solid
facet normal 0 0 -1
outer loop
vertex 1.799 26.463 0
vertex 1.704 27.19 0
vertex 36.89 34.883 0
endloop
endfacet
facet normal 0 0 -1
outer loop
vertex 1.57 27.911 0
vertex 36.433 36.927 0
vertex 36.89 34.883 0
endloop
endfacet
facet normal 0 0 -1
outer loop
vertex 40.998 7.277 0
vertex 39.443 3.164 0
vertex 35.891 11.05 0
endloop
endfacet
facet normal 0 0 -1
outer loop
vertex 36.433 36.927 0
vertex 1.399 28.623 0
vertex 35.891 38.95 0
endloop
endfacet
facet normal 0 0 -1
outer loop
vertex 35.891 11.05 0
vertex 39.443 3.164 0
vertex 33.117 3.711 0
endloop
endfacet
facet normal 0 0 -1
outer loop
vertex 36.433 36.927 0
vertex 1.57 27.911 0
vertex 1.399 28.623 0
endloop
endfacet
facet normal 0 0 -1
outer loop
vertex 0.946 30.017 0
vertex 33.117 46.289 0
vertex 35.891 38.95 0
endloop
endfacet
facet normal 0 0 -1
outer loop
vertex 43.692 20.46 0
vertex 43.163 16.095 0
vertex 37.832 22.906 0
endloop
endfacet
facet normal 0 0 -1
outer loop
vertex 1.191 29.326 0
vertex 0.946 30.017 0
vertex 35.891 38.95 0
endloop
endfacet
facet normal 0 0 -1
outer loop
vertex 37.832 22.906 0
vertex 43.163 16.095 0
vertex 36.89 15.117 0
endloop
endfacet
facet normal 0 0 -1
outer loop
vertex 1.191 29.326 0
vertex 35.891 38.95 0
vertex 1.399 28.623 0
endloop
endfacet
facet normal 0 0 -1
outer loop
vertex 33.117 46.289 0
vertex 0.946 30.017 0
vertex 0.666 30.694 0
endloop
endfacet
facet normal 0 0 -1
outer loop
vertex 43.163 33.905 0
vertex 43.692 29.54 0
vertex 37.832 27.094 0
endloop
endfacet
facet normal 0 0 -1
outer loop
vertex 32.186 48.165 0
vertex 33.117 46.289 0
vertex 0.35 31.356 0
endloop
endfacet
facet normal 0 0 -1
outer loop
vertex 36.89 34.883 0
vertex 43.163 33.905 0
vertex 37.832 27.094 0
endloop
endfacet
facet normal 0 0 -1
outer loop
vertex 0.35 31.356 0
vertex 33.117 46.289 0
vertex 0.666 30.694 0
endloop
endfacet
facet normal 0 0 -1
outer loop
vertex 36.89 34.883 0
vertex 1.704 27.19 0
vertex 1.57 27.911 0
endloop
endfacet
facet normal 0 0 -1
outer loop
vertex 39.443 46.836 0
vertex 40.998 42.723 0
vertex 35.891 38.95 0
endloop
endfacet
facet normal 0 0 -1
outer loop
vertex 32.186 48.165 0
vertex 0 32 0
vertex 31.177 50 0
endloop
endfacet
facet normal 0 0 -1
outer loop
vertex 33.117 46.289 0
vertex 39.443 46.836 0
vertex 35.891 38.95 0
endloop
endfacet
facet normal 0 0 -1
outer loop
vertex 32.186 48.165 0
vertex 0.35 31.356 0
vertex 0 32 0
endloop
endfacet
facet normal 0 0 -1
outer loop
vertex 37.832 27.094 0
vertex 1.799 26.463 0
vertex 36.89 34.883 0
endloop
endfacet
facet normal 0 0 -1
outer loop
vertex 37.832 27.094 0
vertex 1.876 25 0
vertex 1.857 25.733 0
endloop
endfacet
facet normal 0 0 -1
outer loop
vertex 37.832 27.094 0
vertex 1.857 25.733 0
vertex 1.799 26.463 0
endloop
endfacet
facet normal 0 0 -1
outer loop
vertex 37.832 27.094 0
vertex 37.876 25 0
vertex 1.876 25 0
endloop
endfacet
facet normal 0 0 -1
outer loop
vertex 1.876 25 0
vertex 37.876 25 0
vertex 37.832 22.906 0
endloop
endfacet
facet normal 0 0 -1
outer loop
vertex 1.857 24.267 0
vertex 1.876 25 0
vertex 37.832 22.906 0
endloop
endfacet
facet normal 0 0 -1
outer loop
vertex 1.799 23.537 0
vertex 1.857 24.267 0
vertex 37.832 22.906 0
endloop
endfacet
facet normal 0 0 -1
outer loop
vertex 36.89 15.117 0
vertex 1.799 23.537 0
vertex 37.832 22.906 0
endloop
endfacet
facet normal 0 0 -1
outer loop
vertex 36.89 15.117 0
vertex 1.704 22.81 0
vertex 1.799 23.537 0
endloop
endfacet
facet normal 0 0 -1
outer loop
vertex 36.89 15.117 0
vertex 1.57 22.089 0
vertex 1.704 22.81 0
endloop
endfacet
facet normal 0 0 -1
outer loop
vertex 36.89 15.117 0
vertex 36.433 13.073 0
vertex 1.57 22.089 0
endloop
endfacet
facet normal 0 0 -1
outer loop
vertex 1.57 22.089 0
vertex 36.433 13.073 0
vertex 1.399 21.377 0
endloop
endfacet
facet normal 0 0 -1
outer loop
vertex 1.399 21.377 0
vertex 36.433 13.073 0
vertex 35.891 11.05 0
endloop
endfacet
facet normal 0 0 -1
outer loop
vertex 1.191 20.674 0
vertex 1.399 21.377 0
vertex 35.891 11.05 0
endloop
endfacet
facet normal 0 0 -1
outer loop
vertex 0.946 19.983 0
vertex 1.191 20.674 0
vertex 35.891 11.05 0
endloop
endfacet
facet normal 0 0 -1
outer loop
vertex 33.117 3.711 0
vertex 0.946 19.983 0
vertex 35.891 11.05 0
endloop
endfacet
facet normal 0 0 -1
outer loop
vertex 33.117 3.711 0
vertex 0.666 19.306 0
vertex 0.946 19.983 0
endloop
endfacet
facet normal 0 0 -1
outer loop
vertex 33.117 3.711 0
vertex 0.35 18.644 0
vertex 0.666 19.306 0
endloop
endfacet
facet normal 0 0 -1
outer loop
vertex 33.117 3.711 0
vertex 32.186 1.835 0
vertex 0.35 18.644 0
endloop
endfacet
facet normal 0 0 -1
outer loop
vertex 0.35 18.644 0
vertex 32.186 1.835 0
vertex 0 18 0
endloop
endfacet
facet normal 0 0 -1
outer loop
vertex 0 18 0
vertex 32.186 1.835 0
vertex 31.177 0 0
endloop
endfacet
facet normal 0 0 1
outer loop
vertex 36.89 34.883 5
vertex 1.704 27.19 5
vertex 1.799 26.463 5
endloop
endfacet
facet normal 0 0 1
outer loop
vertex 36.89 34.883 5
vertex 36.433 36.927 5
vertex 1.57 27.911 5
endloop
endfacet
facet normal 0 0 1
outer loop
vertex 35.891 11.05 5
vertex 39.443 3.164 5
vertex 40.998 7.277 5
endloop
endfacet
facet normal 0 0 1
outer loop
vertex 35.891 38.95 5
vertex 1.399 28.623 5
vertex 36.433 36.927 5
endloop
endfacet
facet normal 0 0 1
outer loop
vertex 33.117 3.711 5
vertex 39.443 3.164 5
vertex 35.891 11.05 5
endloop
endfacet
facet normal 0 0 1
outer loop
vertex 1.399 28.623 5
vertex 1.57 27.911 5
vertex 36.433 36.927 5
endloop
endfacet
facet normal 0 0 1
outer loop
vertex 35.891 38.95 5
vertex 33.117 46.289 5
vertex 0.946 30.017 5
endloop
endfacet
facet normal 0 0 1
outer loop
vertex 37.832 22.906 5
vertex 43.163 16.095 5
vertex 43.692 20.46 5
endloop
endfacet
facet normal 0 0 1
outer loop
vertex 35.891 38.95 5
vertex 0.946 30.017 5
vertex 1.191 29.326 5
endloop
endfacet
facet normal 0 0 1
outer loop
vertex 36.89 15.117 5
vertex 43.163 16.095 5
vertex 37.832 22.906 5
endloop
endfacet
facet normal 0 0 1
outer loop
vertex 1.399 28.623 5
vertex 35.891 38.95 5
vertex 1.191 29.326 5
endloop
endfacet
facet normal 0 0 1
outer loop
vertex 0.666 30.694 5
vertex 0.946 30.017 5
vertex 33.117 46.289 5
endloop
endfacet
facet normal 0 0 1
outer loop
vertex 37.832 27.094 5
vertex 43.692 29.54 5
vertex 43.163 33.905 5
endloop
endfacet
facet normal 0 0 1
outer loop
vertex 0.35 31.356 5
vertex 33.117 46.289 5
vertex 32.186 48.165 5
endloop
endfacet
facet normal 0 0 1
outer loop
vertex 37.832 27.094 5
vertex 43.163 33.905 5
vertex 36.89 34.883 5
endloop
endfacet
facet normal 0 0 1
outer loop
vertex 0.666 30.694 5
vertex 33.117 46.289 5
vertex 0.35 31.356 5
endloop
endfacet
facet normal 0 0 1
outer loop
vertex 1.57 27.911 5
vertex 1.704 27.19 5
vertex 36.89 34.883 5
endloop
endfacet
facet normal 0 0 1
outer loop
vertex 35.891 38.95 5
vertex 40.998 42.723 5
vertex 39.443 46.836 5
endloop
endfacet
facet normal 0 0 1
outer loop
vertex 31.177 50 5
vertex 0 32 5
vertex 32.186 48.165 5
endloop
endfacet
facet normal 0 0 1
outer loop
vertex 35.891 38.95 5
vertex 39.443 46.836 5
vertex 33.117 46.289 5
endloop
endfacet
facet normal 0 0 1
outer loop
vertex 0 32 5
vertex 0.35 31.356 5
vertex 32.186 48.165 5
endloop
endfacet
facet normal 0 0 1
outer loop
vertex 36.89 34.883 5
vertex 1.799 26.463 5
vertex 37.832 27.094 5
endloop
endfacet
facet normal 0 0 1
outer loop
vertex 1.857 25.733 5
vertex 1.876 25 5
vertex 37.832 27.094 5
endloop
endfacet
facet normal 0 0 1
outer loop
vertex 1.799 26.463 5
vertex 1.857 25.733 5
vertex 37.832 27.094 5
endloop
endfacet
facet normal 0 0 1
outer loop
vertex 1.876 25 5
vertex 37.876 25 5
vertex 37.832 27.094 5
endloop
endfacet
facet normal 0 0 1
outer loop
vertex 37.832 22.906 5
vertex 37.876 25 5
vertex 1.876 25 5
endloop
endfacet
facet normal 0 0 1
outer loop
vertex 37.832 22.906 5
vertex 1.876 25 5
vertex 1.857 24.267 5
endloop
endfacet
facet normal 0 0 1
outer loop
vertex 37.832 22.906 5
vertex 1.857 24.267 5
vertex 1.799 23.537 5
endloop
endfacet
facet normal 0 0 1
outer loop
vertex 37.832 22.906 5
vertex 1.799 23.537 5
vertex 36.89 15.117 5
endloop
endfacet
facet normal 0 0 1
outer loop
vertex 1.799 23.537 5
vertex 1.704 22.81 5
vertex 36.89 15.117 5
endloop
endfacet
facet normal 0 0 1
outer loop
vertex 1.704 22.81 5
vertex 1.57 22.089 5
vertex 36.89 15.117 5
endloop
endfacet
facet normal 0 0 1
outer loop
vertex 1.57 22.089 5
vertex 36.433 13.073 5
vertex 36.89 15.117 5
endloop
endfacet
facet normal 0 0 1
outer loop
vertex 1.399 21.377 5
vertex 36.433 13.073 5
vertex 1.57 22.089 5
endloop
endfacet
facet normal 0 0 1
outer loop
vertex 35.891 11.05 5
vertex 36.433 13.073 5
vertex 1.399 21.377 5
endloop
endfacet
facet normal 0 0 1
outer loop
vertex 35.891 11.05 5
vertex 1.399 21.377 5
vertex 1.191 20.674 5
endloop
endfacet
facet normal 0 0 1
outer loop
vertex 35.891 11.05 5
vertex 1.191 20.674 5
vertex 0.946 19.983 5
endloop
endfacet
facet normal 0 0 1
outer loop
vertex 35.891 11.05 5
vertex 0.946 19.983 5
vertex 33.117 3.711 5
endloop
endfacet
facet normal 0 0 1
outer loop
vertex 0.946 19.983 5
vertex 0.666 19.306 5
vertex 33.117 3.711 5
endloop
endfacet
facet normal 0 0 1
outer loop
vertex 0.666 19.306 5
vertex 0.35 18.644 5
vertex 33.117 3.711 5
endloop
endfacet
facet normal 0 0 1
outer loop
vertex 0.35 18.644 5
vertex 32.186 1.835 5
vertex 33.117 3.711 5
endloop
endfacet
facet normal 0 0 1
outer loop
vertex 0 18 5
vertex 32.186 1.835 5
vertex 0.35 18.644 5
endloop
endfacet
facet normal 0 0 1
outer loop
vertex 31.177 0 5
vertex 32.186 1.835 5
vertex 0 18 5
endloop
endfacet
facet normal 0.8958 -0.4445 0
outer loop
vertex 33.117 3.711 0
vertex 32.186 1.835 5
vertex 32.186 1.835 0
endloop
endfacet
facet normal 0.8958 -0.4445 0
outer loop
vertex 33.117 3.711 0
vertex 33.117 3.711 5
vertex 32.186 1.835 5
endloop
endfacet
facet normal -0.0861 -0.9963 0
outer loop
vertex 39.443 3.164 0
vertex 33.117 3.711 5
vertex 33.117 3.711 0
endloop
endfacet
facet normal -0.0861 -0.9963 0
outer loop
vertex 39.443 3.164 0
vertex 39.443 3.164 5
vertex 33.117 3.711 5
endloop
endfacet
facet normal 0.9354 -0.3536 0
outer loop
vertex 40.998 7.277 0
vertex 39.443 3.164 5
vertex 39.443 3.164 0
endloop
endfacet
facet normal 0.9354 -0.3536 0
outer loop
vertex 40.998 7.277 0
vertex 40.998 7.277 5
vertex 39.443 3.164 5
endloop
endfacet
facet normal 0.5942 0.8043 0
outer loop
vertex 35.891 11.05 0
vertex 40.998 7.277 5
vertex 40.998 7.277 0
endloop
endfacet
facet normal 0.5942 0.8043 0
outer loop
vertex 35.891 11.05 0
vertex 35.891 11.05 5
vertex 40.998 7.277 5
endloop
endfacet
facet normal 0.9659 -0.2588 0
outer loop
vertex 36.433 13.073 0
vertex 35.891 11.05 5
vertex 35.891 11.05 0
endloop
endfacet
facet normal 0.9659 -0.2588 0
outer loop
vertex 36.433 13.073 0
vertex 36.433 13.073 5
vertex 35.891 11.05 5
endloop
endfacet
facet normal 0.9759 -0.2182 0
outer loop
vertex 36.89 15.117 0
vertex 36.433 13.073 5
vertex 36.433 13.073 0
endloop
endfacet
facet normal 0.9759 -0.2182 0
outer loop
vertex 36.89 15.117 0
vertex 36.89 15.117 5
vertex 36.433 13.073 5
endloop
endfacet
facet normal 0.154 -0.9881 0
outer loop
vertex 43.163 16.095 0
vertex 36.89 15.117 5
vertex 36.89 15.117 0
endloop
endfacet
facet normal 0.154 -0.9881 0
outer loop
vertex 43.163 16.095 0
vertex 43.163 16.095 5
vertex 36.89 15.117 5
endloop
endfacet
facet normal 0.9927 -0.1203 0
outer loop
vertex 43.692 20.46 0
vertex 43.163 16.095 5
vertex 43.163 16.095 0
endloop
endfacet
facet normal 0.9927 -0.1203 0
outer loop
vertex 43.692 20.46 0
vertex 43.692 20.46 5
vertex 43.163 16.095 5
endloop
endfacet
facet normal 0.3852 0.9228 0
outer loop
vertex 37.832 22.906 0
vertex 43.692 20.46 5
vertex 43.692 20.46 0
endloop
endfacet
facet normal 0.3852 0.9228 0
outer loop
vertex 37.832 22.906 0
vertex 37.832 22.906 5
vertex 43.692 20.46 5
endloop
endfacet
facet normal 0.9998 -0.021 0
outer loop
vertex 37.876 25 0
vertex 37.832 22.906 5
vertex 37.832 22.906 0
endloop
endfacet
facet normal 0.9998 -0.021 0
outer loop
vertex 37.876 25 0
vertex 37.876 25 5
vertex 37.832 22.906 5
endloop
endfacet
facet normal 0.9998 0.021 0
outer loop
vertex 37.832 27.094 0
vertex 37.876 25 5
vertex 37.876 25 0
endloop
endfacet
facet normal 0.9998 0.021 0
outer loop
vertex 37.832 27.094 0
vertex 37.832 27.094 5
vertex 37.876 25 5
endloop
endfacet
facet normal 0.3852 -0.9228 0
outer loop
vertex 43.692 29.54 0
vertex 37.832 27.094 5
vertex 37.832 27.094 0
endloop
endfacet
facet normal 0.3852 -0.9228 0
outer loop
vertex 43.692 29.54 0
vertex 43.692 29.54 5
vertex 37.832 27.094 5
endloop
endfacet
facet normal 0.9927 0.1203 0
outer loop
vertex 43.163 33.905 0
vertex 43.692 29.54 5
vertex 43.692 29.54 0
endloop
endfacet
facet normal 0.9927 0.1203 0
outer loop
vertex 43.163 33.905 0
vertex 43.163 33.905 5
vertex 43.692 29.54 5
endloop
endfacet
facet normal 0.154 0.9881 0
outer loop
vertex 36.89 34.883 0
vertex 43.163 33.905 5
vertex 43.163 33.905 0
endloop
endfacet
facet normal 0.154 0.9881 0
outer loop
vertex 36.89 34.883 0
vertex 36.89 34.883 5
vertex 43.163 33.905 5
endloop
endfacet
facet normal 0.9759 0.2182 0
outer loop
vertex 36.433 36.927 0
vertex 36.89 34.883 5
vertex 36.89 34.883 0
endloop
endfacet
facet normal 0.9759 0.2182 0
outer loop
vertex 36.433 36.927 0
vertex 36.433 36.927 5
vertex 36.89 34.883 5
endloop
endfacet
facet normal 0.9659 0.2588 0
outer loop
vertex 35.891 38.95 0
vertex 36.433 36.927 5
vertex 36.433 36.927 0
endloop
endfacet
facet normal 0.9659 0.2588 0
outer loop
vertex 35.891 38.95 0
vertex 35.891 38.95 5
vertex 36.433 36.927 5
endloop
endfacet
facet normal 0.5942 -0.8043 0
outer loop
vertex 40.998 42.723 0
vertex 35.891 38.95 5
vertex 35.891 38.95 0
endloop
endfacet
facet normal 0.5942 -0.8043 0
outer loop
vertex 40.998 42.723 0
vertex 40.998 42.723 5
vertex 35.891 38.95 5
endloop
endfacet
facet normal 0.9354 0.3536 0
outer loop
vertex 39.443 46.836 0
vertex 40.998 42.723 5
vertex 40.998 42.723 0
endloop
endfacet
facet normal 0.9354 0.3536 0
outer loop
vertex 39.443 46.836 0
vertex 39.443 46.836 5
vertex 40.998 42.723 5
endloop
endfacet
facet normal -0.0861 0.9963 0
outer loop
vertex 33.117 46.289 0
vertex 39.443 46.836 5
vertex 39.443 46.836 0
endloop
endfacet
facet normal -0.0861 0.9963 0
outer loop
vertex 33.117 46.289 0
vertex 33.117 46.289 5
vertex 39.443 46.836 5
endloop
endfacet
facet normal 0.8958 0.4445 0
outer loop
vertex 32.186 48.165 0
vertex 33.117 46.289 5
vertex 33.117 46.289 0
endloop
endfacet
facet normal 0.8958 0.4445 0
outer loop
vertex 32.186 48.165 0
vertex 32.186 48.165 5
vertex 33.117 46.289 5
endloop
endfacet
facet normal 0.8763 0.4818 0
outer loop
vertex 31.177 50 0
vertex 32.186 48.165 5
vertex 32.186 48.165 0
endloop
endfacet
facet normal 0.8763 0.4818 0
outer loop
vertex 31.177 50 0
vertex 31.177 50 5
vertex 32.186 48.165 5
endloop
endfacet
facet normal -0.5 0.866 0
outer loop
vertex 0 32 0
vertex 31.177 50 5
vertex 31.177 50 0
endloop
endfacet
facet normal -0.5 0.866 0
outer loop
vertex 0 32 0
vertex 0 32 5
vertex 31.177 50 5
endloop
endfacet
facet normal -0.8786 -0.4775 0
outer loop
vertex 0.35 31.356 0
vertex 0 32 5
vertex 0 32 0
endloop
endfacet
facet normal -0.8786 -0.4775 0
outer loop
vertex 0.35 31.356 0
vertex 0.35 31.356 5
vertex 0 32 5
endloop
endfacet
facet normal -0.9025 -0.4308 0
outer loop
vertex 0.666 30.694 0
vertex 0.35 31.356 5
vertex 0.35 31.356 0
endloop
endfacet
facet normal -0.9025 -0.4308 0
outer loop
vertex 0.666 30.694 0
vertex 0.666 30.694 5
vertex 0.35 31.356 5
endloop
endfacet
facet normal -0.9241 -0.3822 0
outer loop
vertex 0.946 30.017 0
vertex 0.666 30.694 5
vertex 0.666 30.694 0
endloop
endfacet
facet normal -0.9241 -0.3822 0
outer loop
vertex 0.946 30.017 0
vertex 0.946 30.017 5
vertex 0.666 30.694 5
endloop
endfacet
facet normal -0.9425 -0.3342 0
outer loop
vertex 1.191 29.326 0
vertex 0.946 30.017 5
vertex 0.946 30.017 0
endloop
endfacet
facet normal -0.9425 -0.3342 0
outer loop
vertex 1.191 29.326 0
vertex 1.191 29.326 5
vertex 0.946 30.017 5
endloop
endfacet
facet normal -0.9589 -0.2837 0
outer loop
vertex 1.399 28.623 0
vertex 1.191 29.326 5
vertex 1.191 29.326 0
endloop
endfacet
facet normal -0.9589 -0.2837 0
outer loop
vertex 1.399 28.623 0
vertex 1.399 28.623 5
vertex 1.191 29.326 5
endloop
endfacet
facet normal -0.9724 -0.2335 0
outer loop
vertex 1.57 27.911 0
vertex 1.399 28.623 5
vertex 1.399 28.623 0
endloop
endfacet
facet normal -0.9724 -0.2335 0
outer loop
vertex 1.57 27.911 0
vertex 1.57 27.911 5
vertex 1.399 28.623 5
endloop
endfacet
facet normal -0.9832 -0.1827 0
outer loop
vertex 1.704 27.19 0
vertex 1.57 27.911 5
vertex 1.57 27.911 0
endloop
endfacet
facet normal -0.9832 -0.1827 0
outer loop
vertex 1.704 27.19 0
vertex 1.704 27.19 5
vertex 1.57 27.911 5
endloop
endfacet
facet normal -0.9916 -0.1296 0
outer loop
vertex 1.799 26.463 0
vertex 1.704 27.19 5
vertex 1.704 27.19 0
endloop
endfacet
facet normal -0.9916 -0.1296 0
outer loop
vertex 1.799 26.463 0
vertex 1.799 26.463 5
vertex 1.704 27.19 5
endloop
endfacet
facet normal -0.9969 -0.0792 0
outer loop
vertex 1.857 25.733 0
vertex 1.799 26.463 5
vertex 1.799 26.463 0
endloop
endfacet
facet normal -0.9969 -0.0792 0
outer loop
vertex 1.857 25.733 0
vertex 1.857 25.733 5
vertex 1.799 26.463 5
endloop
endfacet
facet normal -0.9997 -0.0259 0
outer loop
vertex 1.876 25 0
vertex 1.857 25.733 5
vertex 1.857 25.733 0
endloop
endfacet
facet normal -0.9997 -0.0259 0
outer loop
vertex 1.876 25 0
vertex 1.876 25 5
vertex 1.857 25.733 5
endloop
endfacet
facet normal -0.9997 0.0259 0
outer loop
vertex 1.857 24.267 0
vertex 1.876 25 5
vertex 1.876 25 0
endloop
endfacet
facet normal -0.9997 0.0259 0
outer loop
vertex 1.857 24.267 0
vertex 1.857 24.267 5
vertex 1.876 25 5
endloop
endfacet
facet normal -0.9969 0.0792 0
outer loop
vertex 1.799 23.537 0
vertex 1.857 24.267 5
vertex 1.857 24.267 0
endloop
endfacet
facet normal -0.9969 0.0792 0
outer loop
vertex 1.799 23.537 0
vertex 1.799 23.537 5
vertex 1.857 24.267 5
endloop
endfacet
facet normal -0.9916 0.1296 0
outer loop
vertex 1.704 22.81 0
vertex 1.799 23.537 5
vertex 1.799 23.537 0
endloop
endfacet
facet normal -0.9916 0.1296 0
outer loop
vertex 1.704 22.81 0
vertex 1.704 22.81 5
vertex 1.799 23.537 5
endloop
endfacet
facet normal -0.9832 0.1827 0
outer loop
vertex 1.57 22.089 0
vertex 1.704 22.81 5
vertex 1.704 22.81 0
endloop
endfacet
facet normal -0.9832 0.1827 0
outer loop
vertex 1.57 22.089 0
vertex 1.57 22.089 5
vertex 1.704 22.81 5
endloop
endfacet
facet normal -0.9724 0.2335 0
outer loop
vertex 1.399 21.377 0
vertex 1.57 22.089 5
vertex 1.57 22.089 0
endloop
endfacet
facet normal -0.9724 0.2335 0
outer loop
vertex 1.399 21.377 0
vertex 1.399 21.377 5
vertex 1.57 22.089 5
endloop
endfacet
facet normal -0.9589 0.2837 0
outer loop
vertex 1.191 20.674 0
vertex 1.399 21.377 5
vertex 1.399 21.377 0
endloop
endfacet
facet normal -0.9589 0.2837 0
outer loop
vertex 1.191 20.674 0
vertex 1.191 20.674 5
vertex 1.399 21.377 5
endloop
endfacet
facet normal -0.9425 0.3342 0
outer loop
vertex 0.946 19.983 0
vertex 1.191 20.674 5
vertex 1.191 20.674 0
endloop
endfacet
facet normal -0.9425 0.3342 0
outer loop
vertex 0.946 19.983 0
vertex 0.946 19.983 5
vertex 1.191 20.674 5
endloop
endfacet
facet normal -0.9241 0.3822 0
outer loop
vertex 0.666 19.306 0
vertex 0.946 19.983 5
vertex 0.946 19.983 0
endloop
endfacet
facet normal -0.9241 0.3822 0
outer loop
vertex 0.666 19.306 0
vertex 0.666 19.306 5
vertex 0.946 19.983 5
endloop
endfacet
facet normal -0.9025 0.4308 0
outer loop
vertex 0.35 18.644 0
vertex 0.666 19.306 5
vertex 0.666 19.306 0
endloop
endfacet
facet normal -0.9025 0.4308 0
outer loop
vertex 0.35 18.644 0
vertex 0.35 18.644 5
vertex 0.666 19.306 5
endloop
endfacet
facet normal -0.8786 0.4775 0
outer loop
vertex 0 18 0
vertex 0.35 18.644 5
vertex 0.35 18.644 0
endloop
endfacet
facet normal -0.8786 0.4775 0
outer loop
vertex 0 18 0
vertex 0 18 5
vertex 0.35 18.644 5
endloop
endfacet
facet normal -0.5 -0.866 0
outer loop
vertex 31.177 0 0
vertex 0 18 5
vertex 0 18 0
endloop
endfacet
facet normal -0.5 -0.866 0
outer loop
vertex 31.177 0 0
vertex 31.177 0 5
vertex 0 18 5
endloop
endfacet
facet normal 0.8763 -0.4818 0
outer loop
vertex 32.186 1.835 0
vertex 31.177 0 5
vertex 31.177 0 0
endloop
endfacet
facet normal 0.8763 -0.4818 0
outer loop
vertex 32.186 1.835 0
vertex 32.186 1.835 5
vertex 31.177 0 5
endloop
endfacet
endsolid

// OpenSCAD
$fn = 32;

// ----------------------------------------------------------------------
// Gear sector: 4 teeth on 60 degrees
// ----------------------------------------------------------------------

// --- parameters (mm) ---
sector_angle = 60;        // sector angle, degrees
root_r = 50;              // root circle radius
tooth_h = 6;              // tooth height over the root circle
teeth = 4;                // number of teeth on the sector
hub_r = 14;               // hub bore radius
plate_t = 5;              // sector thickness, Z
arc_step = 3;             // sampling step of the root/hub arcs, degrees

tip_r = root_r + tooth_h;  // tip circle radius

profile = [[31.177, 0], [32.186, 1.835], [33.117, 3.711], [39.443, 3.164], [40.998, 7.277], [35.891, 11.05], [36.433, 13.073], [36.89, 15.117], [43.163, 16.095], [43.692, 20.46], [37.832, 22.906], [37.876, 25], [37.832, 27.094], [43.692, 29.54], [43.163, 33.905], [36.89, 34.883], [36.433, 36.927], [35.891, 38.95], [40.998, 42.723], [39.443, 46.836], [33.117, 46.289], [32.186, 48.165], [31.177, 50], [0, 32], [0.35, 31.356], [0.666, 30.694], [0.946, 30.017], [1.191, 29.326], [1.399, 28.623], [1.57, 27.911], [1.704, 27.19], [1.799, 26.463], [1.857, 25.733], [1.876, 25], [1.857, 24.267], [1.799, 23.537], [1.704, 22.81], [1.57, 22.089], [1.399, 21.377], [1.191, 20.674], [0.946, 19.983], [0.666, 19.306], [0.35, 18.644], [0, 18]];  // primary outline, 44 points, counter clockwise

// --- the one profile operation ---
linear_extrude(height = plate_t) polygon(points = profile);
